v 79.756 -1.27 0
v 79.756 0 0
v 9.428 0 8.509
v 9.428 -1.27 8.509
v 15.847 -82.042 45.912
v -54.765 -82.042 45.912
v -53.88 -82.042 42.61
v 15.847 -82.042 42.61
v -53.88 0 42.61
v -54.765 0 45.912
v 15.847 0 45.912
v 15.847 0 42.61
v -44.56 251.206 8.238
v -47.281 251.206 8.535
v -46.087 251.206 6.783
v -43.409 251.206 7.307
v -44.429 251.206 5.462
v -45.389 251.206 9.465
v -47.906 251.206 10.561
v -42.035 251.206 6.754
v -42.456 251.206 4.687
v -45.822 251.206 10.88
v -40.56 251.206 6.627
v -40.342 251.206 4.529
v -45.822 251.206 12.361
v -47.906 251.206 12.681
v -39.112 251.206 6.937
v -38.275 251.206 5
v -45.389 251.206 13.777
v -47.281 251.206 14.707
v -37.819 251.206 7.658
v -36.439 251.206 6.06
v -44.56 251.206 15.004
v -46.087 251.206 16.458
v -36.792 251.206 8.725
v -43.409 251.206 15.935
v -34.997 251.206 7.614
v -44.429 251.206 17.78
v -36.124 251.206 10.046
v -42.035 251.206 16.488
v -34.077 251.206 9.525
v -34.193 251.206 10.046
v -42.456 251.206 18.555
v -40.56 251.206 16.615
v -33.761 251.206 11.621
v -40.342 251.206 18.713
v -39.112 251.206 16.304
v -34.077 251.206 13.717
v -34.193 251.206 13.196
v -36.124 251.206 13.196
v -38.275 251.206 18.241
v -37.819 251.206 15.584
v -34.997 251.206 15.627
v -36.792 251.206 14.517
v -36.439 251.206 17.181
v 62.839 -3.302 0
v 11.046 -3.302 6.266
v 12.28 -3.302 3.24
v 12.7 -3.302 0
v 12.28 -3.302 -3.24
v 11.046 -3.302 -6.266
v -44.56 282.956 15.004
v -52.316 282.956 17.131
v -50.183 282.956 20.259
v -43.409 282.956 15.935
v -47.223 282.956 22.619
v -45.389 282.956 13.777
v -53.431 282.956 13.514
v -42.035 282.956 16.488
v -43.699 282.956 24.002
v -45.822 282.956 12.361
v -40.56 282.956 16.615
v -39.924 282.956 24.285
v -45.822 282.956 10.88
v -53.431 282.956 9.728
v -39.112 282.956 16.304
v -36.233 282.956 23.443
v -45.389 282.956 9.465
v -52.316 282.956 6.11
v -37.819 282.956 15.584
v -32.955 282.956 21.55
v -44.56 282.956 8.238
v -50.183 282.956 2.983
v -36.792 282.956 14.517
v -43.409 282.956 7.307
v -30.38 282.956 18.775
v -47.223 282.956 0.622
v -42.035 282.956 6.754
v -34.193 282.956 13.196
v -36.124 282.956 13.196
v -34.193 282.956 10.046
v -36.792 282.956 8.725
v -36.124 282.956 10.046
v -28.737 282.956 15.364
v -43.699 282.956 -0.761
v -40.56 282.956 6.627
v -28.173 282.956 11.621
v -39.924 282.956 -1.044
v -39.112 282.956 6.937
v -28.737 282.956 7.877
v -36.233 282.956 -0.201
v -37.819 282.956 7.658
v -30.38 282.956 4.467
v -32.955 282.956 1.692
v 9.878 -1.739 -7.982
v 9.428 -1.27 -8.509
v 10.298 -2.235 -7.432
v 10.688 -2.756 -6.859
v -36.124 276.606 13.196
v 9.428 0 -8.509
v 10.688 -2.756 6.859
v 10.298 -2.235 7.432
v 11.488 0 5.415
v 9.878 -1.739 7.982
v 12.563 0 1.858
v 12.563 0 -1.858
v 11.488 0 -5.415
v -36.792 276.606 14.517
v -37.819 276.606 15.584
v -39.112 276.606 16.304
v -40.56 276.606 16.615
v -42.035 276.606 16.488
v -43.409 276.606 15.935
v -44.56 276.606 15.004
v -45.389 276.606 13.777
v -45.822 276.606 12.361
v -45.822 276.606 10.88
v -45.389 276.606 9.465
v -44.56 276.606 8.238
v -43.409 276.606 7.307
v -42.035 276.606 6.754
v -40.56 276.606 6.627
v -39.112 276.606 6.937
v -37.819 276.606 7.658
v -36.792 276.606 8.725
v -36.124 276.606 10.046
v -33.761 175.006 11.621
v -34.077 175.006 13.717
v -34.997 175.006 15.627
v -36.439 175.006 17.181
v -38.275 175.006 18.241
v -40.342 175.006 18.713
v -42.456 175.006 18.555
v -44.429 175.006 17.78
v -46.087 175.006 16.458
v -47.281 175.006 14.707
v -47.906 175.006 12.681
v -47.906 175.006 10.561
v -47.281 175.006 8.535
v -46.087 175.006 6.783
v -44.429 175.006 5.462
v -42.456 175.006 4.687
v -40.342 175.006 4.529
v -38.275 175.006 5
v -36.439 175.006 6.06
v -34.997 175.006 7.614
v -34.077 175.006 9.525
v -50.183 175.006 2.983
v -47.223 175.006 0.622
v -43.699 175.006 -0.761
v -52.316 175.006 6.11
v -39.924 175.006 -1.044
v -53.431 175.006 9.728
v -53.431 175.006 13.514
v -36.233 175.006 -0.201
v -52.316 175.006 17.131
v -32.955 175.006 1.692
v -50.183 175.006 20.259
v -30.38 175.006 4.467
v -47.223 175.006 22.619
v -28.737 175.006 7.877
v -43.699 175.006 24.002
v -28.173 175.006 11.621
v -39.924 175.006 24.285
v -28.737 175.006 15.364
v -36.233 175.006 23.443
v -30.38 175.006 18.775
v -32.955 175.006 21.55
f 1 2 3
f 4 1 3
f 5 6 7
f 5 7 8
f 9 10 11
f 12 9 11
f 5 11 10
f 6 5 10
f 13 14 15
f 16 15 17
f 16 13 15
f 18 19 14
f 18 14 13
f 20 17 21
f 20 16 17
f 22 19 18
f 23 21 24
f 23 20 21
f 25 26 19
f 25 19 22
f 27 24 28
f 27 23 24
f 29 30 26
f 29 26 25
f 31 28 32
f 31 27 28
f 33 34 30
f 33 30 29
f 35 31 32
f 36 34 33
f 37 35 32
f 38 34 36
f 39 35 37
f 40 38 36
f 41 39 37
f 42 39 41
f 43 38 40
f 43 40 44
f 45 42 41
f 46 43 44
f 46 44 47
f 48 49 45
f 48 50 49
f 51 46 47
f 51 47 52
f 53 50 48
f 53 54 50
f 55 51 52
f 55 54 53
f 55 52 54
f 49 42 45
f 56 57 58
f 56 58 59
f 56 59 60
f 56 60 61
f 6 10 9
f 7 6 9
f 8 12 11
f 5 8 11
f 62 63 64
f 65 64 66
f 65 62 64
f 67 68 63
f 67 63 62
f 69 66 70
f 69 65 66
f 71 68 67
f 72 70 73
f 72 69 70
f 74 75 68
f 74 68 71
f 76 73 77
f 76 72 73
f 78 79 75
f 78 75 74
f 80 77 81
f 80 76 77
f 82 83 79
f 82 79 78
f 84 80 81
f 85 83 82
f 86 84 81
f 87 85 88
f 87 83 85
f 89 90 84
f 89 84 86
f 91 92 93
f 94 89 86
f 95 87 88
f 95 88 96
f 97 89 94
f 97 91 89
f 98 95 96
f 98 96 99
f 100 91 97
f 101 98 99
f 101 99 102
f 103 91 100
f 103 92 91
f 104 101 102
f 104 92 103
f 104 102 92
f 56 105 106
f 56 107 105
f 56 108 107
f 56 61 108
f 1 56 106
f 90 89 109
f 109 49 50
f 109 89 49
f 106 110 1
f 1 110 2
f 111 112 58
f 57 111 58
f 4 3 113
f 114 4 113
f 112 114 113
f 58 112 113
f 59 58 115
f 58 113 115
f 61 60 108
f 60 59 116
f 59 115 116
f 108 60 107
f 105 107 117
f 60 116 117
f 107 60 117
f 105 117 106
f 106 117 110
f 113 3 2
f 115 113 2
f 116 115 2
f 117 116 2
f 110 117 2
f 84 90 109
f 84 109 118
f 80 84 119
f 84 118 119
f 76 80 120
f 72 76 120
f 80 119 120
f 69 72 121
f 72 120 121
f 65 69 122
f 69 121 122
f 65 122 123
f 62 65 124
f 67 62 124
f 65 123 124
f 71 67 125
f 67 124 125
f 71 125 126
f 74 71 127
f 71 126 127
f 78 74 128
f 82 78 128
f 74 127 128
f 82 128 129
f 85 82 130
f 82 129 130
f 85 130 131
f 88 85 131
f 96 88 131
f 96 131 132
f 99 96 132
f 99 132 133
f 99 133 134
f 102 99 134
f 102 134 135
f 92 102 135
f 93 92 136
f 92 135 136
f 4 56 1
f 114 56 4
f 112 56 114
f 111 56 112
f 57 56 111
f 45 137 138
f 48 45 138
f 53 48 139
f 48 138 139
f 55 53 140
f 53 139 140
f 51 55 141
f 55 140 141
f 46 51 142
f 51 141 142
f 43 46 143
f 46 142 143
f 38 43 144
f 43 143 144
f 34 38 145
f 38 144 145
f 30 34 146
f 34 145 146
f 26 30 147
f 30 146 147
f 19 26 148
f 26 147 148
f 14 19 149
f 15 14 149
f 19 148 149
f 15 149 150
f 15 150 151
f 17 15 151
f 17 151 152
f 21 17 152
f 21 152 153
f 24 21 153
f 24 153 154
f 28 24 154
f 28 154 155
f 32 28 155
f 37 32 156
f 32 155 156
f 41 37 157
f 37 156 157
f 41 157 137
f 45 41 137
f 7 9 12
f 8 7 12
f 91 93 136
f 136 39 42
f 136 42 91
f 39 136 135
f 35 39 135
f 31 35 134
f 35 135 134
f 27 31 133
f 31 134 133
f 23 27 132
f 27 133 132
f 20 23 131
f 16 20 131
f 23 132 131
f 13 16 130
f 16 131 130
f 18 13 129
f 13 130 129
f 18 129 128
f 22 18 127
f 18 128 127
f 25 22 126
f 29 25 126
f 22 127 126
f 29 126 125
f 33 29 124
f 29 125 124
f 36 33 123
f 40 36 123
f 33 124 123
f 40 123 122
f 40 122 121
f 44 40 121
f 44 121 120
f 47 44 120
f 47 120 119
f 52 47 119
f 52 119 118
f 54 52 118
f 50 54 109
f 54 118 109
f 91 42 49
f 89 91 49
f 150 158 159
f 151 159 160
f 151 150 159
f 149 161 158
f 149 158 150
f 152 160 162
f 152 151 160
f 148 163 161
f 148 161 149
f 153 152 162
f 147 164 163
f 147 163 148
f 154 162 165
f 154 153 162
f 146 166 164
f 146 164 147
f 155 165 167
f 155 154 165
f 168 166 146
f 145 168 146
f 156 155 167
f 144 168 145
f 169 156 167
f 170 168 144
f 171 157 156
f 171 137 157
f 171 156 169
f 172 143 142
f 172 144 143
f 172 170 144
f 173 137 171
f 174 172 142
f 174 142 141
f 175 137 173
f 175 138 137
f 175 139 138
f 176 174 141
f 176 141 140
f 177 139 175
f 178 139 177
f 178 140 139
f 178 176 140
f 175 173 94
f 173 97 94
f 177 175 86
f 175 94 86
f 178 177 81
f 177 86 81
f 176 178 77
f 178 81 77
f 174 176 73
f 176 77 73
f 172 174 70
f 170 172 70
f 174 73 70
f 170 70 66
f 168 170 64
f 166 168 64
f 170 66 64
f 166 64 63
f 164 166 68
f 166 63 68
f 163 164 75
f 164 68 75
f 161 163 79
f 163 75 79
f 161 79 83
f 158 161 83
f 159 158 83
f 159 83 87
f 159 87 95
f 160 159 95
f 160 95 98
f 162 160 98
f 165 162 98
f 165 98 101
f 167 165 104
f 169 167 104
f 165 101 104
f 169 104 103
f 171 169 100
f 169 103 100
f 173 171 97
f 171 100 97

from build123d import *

# Parameters (mm, degrees)
F1_DEPTH  = 82.042
F2_R      = 12.7
F3_DEPTH  = 25.4
F5_DEPTH  = 3.302
F6_SIZE   = 2.032
F3_FACE_R = 12.7
F7_DEPTH  = 6.35
F9_R      = 12.7
F10_DEPTH = 76.2
F11_R     = 7.112
F12_DEPTH = 76.2


with BuildPart() as f1:
    # F0 (on Front) → F1 (new body)
    with BuildSketch(Plane.XZ):
        Polygon((-54.764774, 45.911669), (-53.880005, 42.609669), (15.847226, 42.609669), (15.847226, 45.911669), align=None)
    extrude(amount=F1_DEPTH)


with BuildPart() as f3:
    # F2 (on Front) → F3 (new body)
    with BuildSketch(Plane.XZ):
        with Locations((-40.873222, 11.620818)):
            Circle(F2_R)
        with BuildLine():
            ThreePointArc((-36.123694, 10.046018), (-45.877022, 11.620818), (-36.123694, 13.195618))
            Line((-36.123694, 13.195618), (-34.193022, 13.195618))
            Line((-34.193022, 13.195618), (-34.193022, 11.620818))
            Line((-34.193022, 11.620818), (-34.193022, 10.046018))
            Line((-34.193022, 10.046018), (-36.123694, 10.046018))
        make_face(mode=Mode.SUBTRACT)
    extrude(amount=F3_DEPTH)

    # F3_face (on face) → F7 (join)
    with BuildSketch(Plane(origin=(-40.94931, 0, 11.620818), x_dir=(1, 0, 0), z_dir=(0, 1, 0))):
        with Locations((0.076088, 0)):
            Circle(F3_FACE_R)
        with BuildLine():
            ThreePointArc((4.825616, -1.5748), (-4.927712, 0), (4.825616, 1.5748))
            Line((4.825616, 1.5748), (6.756288, 1.5748))
            Line((6.756288, 1.5748), (6.756288, -1.5748))
            Line((6.756288, -1.5748), (4.825616, -1.5748))
        make_face(mode=Mode.SUBTRACT)
    extrude(amount=F7_DEPTH)


with BuildPart() as f5:
    # F4 (on Front) → F5 (new body)
    with BuildSketch(Plane.XZ):
        with BuildLine():
            ThreePointArc((9.427986, 8.509), (12.7, 0), (9.427986, -8.509))
            Line((9.427986, -8.509), (79.756, 0))
            Line((79.756, 0), (9.427986, 8.509))
        make_face()
    extrude(amount=F5_DEPTH)

    # F6
    f6_edges = [f5.edges().sort_by_distance(p)[0] for p in [
        (44.591993, -3.302, 4.2545),
        (44.591993, -3.302, -4.2545),
    ]]
    chamfer(f6_edges, length=F6_SIZE)


with BuildPart() as f3_1:
    # F8: moved
    add(f3.part.moved(Location((0, 276.606, 0))))

    # F9 (on face) → F10 (join)
    with BuildSketch(Plane.XZ.offset(-251.206)):
        with Locations((-40.873222, 11.620818)):
            Circle(F9_R)
    extrude(amount=F10_DEPTH)

    # F11 (on face) → F12 (cut)
    with BuildSketch(Plane.XZ.offset(-175.006)):
        with Locations((-40.873222, 11.620818)):
            Circle(F11_R)
    extrude(amount=-F12_DEPTH, mode=Mode.SUBTRACT)


solid = Compound([f1.part, f5.part, f3_1.part])
